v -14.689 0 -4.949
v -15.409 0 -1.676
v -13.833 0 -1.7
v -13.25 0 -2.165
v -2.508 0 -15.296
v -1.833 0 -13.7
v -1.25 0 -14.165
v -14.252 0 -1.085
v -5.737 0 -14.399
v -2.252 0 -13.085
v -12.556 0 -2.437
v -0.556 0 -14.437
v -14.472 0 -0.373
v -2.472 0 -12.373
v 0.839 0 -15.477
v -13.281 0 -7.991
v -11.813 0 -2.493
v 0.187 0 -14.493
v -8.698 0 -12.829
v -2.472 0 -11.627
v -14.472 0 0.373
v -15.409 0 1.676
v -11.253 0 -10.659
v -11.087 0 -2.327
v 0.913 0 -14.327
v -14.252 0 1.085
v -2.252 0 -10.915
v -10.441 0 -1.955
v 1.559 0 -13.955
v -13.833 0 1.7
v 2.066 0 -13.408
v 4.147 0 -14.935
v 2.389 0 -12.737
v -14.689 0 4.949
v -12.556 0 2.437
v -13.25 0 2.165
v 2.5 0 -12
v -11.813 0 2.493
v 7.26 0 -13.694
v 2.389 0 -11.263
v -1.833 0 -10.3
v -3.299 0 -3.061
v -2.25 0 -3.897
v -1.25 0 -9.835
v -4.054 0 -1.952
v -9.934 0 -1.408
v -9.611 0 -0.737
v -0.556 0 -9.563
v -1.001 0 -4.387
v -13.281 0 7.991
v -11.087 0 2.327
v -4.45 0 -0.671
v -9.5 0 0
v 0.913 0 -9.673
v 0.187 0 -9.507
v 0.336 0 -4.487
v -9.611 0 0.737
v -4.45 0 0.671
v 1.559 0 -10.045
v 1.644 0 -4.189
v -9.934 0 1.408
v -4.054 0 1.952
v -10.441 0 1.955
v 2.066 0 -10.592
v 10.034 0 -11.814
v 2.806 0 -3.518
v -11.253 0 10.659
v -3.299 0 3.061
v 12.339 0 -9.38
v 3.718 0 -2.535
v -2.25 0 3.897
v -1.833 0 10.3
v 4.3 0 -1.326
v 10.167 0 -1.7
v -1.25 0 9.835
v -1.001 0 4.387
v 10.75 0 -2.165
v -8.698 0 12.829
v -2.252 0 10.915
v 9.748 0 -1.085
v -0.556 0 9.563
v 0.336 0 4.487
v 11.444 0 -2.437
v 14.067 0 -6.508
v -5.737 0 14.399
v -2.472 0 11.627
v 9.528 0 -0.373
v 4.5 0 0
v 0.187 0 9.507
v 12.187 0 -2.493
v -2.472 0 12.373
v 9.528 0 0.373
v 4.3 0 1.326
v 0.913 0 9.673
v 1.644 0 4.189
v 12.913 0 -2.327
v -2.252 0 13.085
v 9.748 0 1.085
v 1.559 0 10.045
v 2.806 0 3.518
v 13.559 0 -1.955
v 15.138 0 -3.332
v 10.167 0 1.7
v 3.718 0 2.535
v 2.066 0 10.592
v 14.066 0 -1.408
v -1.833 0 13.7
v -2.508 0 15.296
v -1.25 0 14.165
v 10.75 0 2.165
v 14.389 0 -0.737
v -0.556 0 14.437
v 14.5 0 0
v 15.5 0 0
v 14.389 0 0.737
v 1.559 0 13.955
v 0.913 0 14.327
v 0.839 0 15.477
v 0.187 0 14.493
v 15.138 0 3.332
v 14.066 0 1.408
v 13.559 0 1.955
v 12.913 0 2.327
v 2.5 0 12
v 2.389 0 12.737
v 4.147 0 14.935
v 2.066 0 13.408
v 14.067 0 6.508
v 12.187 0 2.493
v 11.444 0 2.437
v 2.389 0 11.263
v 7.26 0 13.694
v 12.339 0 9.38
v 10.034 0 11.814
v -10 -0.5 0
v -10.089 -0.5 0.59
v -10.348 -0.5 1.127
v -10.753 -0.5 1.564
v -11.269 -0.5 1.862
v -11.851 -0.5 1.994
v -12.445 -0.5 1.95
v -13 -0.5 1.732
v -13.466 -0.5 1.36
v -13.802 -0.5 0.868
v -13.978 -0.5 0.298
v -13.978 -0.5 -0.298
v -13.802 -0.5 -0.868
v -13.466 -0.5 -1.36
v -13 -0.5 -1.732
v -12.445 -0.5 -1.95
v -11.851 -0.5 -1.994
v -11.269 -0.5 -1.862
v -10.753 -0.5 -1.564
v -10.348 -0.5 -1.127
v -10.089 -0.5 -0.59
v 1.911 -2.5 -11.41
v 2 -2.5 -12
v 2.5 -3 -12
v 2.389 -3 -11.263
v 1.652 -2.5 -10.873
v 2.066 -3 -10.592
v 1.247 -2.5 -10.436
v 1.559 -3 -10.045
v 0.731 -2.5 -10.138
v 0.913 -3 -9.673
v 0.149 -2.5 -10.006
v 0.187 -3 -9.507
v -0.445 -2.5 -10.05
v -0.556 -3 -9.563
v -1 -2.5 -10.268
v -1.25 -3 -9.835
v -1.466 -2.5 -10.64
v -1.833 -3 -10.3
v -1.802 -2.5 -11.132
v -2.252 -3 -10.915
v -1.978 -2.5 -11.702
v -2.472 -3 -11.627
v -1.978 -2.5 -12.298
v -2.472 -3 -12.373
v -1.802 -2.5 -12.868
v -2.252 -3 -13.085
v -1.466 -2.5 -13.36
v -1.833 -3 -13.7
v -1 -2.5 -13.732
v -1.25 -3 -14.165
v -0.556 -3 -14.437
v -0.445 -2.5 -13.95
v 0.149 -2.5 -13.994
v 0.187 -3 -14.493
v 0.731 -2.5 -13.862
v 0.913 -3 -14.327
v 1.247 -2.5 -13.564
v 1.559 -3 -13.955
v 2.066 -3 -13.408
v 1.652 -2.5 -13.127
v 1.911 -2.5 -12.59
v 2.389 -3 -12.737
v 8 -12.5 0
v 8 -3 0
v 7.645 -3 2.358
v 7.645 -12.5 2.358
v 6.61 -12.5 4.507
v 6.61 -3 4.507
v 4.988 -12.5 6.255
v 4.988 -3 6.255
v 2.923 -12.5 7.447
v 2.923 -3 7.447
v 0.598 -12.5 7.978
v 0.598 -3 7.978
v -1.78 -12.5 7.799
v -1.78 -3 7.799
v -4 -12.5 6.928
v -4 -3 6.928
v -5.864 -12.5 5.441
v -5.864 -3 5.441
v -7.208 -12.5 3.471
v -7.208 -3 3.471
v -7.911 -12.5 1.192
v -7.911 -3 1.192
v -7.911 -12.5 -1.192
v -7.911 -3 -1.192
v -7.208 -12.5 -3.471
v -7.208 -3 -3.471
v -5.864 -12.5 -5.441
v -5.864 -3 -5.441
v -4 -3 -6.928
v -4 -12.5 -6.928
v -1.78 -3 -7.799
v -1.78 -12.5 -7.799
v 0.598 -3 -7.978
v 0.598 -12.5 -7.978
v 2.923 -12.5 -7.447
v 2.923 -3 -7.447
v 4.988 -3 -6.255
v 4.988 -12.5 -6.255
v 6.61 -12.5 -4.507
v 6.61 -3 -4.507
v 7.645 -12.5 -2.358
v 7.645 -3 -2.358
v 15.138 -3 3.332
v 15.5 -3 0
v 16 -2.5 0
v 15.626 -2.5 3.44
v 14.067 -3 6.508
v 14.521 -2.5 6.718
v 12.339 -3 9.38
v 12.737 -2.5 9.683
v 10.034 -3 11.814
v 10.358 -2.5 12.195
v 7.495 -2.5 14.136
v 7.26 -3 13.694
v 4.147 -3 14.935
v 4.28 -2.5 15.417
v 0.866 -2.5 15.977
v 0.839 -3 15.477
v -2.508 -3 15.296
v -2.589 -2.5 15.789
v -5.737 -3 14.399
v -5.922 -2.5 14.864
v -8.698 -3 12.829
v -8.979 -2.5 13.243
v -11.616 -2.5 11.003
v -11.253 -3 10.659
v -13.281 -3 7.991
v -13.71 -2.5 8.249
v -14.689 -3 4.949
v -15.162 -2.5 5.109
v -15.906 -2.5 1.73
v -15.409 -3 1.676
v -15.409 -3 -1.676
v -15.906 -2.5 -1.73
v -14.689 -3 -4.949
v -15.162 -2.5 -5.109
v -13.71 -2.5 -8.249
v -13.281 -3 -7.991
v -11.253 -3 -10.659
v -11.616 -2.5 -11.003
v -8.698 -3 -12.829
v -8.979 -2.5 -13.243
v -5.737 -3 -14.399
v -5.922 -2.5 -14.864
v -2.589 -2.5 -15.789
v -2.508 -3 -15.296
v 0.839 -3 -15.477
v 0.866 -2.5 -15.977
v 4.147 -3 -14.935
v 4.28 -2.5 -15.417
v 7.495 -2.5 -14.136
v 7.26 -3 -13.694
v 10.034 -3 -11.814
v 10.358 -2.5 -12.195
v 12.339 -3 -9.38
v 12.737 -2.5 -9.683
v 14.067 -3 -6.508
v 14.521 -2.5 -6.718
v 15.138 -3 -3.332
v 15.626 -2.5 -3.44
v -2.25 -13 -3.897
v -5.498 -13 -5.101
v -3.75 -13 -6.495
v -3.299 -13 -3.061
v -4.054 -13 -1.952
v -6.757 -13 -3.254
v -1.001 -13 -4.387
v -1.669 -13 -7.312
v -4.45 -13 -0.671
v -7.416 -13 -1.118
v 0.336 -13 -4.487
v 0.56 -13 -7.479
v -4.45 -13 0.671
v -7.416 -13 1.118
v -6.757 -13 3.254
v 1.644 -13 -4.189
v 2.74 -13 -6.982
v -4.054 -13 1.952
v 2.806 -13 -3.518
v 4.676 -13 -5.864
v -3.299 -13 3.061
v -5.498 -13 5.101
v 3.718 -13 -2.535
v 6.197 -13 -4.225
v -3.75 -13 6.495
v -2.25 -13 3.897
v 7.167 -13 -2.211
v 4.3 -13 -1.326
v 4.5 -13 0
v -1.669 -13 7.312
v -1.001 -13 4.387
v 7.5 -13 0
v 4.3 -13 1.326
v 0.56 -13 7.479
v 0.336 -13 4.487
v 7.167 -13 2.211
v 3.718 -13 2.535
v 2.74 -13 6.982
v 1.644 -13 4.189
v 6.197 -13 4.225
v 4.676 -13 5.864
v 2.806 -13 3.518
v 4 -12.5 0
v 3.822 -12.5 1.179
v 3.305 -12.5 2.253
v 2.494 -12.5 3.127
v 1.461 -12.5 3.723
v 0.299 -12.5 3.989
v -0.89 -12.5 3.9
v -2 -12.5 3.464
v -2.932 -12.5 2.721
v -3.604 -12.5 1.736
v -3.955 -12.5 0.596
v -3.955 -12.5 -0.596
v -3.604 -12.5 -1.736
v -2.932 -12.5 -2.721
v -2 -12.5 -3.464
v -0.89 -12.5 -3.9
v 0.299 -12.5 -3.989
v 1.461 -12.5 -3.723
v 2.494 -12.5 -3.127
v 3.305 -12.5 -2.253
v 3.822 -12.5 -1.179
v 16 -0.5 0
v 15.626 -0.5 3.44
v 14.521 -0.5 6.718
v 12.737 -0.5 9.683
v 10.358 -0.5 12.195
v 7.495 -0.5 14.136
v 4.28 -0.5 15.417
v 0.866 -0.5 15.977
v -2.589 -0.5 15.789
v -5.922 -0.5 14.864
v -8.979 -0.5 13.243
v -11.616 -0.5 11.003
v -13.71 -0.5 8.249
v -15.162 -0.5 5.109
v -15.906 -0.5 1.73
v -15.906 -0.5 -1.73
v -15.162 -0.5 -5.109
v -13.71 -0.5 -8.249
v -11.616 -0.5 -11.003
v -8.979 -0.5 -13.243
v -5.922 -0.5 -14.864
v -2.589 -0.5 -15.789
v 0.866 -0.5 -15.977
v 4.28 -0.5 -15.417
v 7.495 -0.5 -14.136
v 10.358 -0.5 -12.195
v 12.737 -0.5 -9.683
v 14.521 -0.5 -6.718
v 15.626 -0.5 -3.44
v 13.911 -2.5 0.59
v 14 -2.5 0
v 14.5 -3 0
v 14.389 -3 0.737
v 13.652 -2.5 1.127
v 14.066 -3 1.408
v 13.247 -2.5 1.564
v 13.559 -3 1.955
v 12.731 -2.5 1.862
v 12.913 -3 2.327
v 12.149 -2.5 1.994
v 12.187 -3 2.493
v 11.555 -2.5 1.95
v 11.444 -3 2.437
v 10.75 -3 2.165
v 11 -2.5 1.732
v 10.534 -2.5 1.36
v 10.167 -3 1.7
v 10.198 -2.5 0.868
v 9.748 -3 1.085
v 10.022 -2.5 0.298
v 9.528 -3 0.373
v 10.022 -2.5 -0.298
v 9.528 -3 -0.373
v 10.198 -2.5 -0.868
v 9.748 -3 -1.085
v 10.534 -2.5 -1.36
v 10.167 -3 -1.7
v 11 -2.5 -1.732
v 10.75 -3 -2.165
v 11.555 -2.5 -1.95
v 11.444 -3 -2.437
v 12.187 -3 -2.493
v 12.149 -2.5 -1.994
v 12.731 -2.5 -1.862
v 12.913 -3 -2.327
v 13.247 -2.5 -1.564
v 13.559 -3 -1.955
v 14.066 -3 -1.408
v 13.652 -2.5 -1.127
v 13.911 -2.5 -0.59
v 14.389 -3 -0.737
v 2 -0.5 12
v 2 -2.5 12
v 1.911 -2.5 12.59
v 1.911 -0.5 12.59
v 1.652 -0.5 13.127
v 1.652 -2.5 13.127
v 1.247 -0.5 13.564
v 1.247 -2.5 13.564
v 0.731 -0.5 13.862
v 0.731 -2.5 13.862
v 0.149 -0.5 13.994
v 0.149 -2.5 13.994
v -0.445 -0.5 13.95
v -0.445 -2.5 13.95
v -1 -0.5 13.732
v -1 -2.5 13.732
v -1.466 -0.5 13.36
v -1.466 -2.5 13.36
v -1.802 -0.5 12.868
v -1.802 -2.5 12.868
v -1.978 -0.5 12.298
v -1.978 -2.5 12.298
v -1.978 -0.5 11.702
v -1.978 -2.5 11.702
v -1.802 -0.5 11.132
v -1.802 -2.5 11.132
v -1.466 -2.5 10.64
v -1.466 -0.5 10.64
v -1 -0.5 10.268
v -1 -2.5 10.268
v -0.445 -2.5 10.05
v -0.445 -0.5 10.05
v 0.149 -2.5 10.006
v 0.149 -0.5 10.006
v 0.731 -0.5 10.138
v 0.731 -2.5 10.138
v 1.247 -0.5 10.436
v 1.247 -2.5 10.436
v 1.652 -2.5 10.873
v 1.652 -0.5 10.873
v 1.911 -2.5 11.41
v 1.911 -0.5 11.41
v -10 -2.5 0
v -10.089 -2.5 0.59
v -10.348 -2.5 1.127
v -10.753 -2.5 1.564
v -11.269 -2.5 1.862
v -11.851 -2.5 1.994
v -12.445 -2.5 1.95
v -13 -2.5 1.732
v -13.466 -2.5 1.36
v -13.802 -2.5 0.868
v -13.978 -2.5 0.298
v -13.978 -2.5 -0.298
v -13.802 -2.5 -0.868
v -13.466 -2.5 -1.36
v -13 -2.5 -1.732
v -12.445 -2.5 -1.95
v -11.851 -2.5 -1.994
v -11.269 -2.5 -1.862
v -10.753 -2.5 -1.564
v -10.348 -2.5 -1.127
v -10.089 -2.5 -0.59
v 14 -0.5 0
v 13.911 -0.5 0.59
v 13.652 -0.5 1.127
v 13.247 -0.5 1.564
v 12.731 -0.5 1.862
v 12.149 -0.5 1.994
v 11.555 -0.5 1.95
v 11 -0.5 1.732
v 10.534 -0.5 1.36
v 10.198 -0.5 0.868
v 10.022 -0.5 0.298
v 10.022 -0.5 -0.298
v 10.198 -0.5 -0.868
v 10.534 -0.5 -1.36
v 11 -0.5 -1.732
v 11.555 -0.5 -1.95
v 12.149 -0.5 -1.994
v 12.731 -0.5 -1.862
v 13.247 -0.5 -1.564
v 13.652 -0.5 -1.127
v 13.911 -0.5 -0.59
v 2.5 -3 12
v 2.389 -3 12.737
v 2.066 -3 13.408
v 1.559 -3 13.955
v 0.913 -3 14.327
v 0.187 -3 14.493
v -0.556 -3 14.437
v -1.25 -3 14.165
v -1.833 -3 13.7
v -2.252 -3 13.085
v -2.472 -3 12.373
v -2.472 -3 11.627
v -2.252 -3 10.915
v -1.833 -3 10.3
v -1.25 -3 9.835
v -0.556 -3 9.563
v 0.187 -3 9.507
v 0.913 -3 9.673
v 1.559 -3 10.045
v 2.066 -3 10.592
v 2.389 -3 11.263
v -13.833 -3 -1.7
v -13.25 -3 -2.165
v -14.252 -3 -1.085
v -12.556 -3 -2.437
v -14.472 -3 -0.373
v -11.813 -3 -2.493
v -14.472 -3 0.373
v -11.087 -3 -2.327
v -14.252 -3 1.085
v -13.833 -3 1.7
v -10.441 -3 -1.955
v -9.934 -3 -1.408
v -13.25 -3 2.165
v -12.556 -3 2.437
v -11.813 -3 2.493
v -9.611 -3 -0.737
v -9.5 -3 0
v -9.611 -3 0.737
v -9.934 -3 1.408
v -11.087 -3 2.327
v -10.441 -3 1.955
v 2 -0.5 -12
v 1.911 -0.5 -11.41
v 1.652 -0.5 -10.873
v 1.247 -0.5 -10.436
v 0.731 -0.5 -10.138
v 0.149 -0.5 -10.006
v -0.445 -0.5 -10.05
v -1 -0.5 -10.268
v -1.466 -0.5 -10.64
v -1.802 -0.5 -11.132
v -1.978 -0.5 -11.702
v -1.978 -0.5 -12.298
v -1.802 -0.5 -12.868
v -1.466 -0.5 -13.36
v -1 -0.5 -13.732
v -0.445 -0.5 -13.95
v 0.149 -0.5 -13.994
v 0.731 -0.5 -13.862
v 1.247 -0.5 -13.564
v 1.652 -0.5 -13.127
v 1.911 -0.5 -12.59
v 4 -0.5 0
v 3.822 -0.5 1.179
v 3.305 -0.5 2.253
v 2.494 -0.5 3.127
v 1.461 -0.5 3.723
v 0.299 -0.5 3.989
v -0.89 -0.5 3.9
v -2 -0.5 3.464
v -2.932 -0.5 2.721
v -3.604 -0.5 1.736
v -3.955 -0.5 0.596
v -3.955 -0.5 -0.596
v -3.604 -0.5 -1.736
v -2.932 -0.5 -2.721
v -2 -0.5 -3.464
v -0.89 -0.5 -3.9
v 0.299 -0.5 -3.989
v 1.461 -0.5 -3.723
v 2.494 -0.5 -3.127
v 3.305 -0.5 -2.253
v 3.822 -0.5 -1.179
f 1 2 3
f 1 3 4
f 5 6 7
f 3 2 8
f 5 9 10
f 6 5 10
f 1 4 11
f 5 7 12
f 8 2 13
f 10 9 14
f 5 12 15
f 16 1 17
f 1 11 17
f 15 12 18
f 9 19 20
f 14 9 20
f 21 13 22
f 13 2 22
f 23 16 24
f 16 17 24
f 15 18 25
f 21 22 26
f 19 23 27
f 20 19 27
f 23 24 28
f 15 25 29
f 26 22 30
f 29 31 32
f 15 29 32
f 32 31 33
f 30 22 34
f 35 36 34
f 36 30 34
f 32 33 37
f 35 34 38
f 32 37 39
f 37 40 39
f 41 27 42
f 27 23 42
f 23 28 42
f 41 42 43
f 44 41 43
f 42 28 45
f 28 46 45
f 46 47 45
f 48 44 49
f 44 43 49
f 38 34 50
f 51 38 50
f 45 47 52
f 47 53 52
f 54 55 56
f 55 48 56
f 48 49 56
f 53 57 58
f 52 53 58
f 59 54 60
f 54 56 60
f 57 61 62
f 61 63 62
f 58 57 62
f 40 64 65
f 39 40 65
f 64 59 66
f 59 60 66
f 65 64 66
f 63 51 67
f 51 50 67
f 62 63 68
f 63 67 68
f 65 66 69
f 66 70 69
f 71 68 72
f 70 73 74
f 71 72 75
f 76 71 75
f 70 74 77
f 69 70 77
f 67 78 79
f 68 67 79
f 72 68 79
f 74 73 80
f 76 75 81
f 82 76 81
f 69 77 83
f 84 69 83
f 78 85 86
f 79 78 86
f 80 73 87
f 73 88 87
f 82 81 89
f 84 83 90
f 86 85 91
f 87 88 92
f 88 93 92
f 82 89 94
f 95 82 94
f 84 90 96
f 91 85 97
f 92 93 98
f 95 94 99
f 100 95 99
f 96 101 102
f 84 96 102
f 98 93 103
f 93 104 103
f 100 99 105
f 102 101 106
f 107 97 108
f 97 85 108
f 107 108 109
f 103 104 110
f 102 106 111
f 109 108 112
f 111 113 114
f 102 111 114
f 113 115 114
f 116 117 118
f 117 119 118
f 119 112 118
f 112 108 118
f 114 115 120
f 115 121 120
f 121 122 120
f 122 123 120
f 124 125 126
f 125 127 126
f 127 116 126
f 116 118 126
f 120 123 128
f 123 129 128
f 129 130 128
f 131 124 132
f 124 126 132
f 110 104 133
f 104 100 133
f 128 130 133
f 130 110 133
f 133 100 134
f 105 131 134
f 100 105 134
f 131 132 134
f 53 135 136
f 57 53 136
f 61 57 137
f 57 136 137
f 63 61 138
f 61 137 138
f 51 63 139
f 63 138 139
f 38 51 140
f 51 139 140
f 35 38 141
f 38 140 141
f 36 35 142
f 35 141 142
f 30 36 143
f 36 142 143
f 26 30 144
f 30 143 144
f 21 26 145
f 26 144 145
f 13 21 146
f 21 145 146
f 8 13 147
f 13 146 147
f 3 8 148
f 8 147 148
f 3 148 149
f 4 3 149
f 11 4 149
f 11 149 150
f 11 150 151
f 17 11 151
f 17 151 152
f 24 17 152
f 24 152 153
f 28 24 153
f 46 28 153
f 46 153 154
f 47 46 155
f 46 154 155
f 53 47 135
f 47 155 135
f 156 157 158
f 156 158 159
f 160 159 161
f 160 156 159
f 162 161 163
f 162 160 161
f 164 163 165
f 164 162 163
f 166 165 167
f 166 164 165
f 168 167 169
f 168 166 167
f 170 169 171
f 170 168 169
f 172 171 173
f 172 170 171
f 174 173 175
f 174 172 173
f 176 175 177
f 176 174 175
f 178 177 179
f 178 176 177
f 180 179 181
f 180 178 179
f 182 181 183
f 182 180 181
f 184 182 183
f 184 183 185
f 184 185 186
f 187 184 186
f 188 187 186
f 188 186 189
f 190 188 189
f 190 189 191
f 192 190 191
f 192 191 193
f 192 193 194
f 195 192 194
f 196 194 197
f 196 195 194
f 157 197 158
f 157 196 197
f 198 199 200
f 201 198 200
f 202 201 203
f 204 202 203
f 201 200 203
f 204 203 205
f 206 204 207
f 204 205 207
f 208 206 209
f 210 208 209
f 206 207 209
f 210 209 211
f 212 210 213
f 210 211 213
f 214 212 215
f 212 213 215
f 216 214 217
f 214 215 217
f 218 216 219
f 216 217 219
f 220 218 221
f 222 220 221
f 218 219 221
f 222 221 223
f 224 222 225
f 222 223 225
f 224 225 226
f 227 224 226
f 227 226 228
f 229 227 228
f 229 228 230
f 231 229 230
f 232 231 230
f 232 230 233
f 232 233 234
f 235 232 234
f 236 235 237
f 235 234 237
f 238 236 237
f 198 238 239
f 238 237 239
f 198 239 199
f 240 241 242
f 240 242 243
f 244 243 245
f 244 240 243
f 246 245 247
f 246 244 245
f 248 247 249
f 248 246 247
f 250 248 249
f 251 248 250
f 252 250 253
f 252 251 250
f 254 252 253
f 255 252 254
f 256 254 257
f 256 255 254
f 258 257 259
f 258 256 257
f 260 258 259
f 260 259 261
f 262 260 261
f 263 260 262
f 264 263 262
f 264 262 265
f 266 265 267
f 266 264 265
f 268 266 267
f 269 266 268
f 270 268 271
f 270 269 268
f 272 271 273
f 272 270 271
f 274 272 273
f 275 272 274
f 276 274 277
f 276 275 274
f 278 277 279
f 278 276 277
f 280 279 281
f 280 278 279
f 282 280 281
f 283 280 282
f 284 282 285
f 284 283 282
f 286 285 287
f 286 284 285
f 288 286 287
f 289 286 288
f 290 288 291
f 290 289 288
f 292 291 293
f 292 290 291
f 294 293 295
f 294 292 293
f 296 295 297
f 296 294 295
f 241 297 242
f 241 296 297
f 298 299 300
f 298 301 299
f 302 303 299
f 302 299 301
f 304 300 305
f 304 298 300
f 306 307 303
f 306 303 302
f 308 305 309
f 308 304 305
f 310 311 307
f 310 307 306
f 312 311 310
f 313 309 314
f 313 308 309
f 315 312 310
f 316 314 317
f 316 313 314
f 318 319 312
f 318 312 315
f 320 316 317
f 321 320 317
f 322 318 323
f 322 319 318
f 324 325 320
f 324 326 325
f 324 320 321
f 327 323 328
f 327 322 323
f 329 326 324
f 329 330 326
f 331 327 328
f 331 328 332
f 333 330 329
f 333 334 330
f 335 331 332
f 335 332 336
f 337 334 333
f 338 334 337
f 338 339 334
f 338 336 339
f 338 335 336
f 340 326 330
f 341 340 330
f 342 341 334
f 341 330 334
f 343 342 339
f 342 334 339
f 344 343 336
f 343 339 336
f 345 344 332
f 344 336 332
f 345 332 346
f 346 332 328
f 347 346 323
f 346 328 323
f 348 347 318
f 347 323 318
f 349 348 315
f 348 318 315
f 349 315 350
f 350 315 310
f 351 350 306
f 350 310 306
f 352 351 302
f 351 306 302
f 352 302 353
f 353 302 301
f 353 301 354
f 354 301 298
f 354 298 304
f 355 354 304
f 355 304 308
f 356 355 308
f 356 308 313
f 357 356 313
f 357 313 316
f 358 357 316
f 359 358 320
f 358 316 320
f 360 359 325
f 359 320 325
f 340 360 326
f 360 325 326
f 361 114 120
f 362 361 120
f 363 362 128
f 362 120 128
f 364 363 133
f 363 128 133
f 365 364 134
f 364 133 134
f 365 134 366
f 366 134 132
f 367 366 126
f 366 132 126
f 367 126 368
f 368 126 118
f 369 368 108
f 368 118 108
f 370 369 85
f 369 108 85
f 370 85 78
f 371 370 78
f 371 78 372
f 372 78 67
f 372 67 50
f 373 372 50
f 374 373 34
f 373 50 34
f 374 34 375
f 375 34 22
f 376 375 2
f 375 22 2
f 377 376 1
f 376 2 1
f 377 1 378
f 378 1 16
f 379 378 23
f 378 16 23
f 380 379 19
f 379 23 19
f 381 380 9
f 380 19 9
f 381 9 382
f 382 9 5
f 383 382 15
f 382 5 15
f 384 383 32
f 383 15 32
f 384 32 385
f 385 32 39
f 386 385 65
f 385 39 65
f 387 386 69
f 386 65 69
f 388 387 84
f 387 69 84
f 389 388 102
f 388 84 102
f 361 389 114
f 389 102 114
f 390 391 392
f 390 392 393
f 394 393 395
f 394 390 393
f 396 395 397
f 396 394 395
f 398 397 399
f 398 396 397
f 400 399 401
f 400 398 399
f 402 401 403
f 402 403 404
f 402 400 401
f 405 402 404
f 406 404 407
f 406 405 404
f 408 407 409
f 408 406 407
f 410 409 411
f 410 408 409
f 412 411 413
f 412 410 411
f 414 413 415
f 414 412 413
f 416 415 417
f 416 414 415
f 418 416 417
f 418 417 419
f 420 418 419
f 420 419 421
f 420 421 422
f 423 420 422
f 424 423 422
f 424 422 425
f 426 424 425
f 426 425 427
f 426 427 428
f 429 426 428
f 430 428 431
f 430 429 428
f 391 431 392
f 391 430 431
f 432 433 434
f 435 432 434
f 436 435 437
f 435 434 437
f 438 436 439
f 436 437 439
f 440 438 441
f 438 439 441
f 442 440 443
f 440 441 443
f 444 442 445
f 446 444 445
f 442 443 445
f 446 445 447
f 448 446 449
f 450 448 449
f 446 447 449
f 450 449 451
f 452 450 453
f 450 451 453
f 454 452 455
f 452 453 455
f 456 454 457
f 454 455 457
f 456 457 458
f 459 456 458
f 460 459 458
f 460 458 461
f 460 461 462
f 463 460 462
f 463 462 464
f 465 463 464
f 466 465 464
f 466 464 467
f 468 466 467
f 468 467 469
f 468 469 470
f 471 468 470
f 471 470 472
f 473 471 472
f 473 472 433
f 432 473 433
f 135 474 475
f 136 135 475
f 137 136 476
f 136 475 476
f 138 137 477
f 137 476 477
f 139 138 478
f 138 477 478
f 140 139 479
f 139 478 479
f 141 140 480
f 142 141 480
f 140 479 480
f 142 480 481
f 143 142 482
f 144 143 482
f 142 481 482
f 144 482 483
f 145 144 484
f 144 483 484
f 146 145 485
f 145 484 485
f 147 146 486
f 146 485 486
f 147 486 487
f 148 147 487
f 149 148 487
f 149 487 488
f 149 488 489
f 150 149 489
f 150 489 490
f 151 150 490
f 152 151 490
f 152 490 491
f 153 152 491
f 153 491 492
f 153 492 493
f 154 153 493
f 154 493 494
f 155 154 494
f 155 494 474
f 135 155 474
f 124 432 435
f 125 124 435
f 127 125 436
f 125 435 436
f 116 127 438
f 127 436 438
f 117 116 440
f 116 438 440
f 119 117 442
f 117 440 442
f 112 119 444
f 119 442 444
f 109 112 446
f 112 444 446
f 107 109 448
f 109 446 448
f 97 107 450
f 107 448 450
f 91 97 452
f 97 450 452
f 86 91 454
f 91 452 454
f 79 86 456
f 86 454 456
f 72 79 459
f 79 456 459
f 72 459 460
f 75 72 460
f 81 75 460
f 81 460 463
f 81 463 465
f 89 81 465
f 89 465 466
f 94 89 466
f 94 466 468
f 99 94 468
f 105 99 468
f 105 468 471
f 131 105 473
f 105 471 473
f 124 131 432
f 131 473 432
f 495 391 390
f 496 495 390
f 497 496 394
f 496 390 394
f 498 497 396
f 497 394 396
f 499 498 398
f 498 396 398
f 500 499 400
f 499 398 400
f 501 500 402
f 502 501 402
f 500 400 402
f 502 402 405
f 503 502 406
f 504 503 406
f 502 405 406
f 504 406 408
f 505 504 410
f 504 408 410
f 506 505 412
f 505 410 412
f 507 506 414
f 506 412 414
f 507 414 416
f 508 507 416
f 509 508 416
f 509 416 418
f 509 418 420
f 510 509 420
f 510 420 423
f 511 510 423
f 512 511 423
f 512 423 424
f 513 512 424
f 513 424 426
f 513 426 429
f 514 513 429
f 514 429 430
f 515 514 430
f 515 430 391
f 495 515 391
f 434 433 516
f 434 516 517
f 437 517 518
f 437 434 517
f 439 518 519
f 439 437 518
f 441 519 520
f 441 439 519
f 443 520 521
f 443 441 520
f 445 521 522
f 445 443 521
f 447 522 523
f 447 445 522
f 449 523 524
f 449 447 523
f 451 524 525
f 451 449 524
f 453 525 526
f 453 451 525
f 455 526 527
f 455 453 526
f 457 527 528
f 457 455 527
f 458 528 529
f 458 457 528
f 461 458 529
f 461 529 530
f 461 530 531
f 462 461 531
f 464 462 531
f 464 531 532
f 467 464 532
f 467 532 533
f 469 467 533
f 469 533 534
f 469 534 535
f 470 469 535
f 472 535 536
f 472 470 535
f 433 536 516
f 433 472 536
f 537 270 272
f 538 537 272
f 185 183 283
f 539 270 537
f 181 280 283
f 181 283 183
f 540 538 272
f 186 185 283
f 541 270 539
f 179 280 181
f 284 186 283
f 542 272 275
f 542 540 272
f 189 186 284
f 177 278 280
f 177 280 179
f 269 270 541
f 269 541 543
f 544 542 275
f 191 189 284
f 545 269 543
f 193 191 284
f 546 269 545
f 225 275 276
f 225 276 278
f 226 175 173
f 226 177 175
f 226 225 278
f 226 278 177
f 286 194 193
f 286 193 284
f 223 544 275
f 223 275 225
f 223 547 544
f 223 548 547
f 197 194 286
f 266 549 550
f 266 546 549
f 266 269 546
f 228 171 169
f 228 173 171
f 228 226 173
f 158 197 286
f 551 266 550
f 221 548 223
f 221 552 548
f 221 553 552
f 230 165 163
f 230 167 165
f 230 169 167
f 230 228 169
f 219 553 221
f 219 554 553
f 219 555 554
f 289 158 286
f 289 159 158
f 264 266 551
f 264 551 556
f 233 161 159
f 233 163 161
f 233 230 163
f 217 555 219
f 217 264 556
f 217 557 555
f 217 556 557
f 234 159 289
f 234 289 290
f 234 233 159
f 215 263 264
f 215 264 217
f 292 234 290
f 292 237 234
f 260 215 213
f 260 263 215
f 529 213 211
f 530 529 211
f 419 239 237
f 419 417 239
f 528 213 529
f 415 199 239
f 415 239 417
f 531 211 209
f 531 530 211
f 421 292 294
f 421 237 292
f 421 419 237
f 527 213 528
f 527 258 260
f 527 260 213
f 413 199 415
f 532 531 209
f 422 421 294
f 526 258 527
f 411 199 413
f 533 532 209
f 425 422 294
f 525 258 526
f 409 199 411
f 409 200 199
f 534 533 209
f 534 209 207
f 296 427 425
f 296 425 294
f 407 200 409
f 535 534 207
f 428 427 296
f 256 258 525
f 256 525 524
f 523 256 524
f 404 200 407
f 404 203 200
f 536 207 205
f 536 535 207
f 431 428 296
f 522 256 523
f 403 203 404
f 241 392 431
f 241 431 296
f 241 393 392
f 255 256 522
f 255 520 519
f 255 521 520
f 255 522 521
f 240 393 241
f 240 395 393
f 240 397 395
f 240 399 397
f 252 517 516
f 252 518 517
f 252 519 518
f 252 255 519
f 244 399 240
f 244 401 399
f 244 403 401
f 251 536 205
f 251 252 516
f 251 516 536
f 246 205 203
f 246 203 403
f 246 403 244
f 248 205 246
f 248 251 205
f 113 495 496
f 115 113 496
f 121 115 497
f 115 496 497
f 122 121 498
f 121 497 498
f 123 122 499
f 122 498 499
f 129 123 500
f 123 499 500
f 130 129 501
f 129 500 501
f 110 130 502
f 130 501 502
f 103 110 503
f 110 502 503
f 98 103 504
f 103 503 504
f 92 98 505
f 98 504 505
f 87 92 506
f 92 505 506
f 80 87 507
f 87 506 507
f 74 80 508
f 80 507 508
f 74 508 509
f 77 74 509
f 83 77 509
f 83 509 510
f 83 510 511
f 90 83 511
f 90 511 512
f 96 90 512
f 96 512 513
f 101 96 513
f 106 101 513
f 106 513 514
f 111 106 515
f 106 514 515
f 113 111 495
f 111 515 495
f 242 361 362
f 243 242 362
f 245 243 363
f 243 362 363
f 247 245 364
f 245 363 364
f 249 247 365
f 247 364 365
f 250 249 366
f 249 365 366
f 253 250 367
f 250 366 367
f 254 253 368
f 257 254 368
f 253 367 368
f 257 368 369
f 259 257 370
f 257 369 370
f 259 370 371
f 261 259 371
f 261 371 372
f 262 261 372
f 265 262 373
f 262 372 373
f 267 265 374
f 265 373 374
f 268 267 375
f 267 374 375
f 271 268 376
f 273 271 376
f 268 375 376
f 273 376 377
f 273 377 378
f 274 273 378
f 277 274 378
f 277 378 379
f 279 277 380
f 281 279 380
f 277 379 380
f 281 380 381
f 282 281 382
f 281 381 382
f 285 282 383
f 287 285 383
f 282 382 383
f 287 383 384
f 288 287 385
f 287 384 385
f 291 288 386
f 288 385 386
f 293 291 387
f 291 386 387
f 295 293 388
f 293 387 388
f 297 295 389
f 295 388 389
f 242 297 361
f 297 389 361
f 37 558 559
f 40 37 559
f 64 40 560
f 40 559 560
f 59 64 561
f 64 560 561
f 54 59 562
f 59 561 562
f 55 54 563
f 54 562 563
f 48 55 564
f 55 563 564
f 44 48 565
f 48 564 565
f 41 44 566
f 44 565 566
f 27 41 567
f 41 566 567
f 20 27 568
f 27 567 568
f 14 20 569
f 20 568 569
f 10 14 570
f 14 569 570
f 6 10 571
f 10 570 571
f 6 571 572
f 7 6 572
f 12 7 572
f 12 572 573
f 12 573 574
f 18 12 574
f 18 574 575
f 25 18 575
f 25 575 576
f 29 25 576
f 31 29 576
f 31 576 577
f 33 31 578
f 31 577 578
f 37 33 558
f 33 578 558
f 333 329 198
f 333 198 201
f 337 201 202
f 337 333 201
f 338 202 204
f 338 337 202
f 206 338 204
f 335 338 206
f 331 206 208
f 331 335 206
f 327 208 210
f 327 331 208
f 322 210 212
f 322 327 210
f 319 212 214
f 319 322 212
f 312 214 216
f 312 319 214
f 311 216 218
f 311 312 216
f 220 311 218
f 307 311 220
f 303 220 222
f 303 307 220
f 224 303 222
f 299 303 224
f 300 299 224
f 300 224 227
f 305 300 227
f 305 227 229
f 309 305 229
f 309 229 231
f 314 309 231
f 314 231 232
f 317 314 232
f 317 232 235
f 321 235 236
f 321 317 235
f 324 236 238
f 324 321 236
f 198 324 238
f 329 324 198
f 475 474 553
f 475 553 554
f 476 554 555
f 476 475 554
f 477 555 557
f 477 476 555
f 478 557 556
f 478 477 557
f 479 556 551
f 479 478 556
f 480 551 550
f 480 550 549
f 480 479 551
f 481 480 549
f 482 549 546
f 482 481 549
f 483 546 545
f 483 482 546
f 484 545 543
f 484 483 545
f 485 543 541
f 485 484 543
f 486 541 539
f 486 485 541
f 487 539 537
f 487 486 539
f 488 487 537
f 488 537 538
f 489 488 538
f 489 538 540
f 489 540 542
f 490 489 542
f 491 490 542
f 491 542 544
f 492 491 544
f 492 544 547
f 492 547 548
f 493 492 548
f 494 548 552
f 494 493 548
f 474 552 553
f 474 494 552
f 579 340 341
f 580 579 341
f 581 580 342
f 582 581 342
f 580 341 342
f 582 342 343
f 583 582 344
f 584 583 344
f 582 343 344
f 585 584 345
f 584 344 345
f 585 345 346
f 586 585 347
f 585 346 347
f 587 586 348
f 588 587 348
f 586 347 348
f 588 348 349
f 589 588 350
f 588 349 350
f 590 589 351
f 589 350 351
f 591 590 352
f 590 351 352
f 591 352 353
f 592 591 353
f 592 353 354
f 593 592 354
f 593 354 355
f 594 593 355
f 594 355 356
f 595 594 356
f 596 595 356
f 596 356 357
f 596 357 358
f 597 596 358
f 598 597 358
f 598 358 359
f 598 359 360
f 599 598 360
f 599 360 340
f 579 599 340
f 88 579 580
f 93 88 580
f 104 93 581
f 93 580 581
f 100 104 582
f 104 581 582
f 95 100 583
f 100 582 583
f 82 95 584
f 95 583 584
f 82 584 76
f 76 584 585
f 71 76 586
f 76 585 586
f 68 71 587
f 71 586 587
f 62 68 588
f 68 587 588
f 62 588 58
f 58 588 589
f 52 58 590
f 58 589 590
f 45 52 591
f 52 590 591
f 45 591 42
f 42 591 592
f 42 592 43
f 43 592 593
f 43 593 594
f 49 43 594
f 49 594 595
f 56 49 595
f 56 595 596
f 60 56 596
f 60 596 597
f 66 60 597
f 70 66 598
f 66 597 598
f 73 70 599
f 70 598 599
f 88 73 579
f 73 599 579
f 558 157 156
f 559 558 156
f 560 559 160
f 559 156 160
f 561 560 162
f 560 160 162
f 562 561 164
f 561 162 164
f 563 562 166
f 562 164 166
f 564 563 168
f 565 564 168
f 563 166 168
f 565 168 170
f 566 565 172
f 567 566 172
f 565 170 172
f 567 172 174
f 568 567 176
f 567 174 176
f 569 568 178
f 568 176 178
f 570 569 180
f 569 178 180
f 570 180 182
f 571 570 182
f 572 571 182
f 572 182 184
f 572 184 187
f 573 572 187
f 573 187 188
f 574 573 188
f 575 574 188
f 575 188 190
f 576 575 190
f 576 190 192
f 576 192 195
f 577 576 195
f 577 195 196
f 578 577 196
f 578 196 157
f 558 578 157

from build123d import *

# Parameters (mm, degrees)
F0_R     = 16
F1_DEPTH = 3
F2_R     = 8
F3_DEPTH = 10
F4_R     = 4
F5_DEPTH = 13.001
F6_R     = 2
F7_DEPTH = 3.001
F8_SIZE  = 0.5


with BuildPart() as f1:
    # F0 (on Front) → F1 (new body)
    with BuildSketch(Plane.XZ):
        Circle(F0_R)
    extrude(amount=F1_DEPTH)

    # F2 (on face) → F3 (join)
    with BuildSketch(Plane.XZ.offset(3)):
        Circle(F2_R)
    extrude(amount=F3_DEPTH)

    # F4 (on face) → F5 (cut, through all)
    with BuildSketch(Plane.XZ.offset(13)):
        Circle(F4_R)
    extrude(amount=-F5_DEPTH, mode=Mode.SUBTRACT)

    # F6 (on face) → F7 (cut, through all)
    with BuildSketch(Plane.XZ.offset(3)):
        with Locations((0, 12)):
            Circle(F6_R)
        with Locations((-12, 0)):
            Circle(F6_R)
        with Locations((0, -12)):
            Circle(F6_R)
        with Locations((12, 0)):
            Circle(F6_R)
    extrude(amount=-F7_DEPTH, mode=Mode.SUBTRACT)

    # F8
    f8_edges = [f1.edges().sort_by_distance(p)[0] for p in [
        (-8, -13, 0),
        (-4, -13, 0),
        (-16, 0, 0),
        (-2, 0, -12),
        (-14, 0, 0),
        (-4, 0, 0),
        (10, 0, 0),
        (-2, 0, 12),
        (-16, -3, 0),
        (-2, -3, 12),
        (-14, -3, 0),
        (10, -3, 0),
        (-2, -3, -12),
    ]]
    chamfer(f8_edges, length=F8_SIZE)


solid = f1.part
